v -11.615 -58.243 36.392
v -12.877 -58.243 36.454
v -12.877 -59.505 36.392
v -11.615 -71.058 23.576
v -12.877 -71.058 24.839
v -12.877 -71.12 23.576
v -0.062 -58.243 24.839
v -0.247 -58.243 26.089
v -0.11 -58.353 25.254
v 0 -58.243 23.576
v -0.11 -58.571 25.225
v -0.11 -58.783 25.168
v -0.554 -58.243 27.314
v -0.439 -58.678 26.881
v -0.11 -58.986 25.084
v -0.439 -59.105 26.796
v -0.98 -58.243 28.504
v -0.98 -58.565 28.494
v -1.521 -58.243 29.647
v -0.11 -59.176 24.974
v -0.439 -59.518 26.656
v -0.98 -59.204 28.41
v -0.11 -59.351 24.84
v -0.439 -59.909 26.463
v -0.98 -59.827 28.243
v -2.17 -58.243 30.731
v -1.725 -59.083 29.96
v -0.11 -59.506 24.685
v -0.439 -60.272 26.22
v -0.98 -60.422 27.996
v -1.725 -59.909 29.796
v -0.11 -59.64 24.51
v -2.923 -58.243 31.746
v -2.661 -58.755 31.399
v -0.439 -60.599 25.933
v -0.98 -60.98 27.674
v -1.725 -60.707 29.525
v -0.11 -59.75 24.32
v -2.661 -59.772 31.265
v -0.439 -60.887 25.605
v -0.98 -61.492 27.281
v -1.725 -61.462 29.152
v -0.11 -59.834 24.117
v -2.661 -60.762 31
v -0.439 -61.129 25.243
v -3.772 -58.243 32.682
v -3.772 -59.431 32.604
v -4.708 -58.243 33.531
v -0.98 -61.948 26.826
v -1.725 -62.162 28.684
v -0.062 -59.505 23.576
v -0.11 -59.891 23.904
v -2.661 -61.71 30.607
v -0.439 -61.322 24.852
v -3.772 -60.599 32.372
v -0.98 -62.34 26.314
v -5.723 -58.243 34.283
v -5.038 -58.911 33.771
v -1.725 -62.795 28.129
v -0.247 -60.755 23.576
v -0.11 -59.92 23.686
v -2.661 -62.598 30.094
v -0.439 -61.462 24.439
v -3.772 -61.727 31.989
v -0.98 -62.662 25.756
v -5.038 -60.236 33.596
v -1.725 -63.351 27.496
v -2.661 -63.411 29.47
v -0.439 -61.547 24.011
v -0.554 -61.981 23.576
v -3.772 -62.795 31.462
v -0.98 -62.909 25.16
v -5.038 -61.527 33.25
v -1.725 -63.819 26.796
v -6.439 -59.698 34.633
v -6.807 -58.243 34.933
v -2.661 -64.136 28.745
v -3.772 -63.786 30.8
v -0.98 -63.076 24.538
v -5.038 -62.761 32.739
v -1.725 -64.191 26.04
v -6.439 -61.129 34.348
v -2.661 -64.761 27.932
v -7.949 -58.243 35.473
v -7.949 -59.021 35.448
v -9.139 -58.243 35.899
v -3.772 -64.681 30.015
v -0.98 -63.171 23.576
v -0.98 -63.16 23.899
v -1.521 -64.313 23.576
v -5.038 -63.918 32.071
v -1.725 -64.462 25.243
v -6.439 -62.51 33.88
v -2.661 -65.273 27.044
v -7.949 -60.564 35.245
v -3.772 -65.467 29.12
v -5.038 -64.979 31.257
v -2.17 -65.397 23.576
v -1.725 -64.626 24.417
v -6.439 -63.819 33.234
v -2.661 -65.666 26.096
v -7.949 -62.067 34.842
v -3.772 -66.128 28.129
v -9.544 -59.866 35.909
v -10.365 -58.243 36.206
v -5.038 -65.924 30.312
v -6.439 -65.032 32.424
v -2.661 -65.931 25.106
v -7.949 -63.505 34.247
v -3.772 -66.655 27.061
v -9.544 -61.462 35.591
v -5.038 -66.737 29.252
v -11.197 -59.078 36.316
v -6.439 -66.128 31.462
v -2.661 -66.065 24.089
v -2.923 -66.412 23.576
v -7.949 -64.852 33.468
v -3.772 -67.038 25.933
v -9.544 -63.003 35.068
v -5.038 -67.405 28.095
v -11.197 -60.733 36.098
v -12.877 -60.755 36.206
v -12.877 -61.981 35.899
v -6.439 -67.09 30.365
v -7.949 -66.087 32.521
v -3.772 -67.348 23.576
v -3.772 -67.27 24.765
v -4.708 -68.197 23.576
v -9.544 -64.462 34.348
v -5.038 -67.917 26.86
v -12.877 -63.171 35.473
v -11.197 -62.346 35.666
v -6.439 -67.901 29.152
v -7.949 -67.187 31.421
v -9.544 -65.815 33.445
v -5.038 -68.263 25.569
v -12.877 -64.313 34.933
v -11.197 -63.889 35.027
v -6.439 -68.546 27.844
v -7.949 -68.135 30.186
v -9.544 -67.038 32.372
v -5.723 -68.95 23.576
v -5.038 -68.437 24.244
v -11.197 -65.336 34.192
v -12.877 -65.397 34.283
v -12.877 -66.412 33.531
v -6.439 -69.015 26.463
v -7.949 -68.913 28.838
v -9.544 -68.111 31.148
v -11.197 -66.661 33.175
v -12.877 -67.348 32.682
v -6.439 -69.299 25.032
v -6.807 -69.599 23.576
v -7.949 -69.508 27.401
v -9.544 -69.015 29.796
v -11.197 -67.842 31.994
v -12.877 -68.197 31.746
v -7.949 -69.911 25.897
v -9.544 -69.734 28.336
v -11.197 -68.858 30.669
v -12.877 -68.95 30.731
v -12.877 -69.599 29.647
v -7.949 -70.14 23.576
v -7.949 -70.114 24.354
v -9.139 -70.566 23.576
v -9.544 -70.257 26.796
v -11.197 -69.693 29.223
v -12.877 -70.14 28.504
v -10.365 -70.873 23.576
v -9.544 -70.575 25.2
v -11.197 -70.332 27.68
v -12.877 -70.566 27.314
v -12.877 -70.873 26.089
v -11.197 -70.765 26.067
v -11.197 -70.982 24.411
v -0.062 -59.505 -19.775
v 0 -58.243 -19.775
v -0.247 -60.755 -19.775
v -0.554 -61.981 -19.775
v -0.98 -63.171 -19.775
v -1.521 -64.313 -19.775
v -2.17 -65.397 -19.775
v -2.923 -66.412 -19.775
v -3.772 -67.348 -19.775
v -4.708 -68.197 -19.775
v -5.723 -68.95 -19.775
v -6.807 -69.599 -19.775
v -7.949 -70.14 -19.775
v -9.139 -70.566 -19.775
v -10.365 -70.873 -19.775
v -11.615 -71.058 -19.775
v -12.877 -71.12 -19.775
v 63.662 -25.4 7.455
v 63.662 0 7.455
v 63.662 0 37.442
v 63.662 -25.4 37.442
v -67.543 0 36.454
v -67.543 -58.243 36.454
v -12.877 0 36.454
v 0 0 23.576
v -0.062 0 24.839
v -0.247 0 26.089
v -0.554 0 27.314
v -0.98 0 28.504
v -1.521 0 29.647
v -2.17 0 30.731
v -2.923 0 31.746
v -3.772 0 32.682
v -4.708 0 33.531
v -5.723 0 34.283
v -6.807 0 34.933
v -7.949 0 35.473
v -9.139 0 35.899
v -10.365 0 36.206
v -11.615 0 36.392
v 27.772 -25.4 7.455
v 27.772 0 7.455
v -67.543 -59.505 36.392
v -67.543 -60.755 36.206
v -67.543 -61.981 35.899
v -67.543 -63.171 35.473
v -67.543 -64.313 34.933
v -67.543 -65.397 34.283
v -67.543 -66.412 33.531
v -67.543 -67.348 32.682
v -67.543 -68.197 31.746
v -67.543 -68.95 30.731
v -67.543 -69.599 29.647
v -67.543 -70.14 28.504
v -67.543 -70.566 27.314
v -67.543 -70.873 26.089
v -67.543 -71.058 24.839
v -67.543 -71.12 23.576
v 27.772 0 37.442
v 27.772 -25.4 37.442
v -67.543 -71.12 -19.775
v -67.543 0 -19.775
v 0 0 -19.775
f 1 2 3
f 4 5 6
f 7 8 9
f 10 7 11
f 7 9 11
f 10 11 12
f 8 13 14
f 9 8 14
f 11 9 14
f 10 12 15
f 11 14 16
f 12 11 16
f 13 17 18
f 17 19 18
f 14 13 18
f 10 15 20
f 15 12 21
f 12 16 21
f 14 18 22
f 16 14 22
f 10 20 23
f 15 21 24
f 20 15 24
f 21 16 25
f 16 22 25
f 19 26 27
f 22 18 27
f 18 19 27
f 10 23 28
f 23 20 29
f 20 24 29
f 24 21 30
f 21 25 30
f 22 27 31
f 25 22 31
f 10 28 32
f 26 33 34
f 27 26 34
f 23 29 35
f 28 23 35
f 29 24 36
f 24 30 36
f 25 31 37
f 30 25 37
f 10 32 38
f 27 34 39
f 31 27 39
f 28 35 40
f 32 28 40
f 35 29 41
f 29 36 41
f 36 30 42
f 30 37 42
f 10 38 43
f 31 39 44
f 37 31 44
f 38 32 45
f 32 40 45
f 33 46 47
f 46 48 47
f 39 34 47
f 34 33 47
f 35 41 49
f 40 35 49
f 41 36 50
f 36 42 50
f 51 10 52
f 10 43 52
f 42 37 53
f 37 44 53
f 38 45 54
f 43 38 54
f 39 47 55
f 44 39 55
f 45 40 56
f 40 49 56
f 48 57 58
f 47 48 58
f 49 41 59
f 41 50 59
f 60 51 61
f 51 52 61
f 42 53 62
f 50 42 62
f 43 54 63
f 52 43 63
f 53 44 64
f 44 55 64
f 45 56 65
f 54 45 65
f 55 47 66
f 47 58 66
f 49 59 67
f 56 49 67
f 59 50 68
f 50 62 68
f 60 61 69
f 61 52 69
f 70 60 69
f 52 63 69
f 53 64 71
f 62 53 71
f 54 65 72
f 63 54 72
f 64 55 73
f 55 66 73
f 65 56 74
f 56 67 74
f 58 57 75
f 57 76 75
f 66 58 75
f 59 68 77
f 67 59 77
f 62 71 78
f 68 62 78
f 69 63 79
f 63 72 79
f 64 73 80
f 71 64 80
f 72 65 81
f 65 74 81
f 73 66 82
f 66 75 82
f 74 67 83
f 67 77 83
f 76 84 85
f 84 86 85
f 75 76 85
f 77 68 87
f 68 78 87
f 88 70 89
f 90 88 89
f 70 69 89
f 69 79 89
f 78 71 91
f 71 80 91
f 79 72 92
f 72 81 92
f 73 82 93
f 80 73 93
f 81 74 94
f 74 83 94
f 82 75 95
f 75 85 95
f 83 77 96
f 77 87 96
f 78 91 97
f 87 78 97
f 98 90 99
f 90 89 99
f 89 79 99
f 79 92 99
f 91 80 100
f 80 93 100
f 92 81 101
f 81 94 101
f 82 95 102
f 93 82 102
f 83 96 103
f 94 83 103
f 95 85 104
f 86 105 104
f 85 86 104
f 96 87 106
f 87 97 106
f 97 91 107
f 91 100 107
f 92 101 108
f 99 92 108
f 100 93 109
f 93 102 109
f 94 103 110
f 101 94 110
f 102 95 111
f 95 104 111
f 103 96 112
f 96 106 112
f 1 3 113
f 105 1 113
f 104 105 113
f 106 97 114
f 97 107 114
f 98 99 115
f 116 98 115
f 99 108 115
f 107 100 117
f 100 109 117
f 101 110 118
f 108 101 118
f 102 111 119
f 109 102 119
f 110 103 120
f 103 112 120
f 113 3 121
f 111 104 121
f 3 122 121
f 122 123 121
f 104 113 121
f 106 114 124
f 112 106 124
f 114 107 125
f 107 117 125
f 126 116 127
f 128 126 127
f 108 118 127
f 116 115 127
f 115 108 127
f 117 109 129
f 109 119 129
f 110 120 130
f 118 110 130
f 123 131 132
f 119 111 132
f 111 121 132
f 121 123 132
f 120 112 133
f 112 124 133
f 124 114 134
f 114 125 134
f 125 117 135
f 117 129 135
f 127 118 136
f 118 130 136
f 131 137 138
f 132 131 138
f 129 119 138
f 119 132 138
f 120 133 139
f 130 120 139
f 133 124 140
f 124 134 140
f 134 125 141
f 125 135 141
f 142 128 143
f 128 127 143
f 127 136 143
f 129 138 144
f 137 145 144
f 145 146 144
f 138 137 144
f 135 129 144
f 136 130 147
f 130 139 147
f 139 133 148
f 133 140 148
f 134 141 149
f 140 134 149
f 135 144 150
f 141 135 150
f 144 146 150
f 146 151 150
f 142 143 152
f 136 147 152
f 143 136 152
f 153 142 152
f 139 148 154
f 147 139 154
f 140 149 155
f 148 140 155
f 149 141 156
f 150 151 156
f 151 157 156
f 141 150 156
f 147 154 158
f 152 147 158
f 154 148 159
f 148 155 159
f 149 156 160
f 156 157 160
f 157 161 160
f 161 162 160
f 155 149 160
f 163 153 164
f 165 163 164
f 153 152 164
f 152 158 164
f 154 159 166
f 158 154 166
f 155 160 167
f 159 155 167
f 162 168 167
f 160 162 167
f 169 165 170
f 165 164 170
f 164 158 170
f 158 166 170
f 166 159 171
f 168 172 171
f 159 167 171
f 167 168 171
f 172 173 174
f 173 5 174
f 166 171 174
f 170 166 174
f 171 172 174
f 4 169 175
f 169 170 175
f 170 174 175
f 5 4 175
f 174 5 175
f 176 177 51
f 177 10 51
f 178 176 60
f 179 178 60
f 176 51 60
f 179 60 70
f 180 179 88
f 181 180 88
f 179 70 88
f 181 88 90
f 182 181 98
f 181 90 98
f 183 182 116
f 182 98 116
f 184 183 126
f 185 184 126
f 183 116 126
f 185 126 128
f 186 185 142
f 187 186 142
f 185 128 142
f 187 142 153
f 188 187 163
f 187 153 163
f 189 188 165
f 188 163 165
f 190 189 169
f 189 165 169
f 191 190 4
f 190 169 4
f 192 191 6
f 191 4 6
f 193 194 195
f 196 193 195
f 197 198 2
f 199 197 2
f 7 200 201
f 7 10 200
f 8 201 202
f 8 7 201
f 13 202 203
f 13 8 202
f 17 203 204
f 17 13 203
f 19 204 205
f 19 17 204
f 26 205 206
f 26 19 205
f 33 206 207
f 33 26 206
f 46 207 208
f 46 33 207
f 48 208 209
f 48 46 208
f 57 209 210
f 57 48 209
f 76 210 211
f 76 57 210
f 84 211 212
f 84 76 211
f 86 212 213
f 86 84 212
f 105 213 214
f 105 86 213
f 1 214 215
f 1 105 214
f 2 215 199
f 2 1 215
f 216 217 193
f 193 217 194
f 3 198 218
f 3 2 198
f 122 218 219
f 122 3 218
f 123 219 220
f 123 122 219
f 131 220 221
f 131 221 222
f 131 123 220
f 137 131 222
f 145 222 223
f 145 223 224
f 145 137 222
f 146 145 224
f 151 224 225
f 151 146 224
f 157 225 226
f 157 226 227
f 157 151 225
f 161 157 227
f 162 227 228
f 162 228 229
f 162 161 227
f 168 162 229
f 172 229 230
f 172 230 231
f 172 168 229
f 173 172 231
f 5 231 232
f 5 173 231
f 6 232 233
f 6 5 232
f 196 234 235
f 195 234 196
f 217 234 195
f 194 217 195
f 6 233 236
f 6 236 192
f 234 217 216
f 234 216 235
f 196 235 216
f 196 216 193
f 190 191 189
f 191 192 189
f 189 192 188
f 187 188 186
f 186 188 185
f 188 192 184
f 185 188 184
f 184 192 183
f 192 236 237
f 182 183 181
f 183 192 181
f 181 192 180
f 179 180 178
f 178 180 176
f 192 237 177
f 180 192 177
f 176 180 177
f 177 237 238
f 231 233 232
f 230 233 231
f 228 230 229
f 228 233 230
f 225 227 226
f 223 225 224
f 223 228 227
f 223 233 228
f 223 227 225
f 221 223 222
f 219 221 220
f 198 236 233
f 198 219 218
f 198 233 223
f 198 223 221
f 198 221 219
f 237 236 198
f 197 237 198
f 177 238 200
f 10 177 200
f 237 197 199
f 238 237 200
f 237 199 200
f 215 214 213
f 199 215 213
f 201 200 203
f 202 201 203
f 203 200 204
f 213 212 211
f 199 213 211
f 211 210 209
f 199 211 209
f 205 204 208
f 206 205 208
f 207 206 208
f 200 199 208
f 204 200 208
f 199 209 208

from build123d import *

# Parameters (mm, degrees)
F0_W     = 67.543469
F0_H     = 56.228885
F1_DEPTH = 71.12
F2_R     = 12.877415
F3_W     = 35.889428
F3_H     = 29.987364
F4_DEPTH = 25.4


with BuildPart() as f1:
    # F0 (on Front) → F1 (new body)
    with BuildSketch(Plane.XZ):
        with Locations((-33.771735, 8.339288)):
            Rectangle(F0_W, F0_H)
    extrude(amount=F1_DEPTH)

    # F2
    f2_edges = [f1.edges().sort_by_distance(p)[0] for p in [
        (-33.771735, -71.12, 36.453731),
        (0, -35.56, 36.453731),
        (0, -71.12, 8.339289),
    ]]
    fillet(f2_edges, radius=F2_R)


with BuildPart() as f4:
    # F3 (on Front) → F4 (new body)
    with BuildSketch(Plane.XZ):
        with Locations((45.716846, 22.44832)):
            Rectangle(F3_W, F3_H)
    extrude(amount=F4_DEPTH)


solid = Compound([f1.part, f4.part])
